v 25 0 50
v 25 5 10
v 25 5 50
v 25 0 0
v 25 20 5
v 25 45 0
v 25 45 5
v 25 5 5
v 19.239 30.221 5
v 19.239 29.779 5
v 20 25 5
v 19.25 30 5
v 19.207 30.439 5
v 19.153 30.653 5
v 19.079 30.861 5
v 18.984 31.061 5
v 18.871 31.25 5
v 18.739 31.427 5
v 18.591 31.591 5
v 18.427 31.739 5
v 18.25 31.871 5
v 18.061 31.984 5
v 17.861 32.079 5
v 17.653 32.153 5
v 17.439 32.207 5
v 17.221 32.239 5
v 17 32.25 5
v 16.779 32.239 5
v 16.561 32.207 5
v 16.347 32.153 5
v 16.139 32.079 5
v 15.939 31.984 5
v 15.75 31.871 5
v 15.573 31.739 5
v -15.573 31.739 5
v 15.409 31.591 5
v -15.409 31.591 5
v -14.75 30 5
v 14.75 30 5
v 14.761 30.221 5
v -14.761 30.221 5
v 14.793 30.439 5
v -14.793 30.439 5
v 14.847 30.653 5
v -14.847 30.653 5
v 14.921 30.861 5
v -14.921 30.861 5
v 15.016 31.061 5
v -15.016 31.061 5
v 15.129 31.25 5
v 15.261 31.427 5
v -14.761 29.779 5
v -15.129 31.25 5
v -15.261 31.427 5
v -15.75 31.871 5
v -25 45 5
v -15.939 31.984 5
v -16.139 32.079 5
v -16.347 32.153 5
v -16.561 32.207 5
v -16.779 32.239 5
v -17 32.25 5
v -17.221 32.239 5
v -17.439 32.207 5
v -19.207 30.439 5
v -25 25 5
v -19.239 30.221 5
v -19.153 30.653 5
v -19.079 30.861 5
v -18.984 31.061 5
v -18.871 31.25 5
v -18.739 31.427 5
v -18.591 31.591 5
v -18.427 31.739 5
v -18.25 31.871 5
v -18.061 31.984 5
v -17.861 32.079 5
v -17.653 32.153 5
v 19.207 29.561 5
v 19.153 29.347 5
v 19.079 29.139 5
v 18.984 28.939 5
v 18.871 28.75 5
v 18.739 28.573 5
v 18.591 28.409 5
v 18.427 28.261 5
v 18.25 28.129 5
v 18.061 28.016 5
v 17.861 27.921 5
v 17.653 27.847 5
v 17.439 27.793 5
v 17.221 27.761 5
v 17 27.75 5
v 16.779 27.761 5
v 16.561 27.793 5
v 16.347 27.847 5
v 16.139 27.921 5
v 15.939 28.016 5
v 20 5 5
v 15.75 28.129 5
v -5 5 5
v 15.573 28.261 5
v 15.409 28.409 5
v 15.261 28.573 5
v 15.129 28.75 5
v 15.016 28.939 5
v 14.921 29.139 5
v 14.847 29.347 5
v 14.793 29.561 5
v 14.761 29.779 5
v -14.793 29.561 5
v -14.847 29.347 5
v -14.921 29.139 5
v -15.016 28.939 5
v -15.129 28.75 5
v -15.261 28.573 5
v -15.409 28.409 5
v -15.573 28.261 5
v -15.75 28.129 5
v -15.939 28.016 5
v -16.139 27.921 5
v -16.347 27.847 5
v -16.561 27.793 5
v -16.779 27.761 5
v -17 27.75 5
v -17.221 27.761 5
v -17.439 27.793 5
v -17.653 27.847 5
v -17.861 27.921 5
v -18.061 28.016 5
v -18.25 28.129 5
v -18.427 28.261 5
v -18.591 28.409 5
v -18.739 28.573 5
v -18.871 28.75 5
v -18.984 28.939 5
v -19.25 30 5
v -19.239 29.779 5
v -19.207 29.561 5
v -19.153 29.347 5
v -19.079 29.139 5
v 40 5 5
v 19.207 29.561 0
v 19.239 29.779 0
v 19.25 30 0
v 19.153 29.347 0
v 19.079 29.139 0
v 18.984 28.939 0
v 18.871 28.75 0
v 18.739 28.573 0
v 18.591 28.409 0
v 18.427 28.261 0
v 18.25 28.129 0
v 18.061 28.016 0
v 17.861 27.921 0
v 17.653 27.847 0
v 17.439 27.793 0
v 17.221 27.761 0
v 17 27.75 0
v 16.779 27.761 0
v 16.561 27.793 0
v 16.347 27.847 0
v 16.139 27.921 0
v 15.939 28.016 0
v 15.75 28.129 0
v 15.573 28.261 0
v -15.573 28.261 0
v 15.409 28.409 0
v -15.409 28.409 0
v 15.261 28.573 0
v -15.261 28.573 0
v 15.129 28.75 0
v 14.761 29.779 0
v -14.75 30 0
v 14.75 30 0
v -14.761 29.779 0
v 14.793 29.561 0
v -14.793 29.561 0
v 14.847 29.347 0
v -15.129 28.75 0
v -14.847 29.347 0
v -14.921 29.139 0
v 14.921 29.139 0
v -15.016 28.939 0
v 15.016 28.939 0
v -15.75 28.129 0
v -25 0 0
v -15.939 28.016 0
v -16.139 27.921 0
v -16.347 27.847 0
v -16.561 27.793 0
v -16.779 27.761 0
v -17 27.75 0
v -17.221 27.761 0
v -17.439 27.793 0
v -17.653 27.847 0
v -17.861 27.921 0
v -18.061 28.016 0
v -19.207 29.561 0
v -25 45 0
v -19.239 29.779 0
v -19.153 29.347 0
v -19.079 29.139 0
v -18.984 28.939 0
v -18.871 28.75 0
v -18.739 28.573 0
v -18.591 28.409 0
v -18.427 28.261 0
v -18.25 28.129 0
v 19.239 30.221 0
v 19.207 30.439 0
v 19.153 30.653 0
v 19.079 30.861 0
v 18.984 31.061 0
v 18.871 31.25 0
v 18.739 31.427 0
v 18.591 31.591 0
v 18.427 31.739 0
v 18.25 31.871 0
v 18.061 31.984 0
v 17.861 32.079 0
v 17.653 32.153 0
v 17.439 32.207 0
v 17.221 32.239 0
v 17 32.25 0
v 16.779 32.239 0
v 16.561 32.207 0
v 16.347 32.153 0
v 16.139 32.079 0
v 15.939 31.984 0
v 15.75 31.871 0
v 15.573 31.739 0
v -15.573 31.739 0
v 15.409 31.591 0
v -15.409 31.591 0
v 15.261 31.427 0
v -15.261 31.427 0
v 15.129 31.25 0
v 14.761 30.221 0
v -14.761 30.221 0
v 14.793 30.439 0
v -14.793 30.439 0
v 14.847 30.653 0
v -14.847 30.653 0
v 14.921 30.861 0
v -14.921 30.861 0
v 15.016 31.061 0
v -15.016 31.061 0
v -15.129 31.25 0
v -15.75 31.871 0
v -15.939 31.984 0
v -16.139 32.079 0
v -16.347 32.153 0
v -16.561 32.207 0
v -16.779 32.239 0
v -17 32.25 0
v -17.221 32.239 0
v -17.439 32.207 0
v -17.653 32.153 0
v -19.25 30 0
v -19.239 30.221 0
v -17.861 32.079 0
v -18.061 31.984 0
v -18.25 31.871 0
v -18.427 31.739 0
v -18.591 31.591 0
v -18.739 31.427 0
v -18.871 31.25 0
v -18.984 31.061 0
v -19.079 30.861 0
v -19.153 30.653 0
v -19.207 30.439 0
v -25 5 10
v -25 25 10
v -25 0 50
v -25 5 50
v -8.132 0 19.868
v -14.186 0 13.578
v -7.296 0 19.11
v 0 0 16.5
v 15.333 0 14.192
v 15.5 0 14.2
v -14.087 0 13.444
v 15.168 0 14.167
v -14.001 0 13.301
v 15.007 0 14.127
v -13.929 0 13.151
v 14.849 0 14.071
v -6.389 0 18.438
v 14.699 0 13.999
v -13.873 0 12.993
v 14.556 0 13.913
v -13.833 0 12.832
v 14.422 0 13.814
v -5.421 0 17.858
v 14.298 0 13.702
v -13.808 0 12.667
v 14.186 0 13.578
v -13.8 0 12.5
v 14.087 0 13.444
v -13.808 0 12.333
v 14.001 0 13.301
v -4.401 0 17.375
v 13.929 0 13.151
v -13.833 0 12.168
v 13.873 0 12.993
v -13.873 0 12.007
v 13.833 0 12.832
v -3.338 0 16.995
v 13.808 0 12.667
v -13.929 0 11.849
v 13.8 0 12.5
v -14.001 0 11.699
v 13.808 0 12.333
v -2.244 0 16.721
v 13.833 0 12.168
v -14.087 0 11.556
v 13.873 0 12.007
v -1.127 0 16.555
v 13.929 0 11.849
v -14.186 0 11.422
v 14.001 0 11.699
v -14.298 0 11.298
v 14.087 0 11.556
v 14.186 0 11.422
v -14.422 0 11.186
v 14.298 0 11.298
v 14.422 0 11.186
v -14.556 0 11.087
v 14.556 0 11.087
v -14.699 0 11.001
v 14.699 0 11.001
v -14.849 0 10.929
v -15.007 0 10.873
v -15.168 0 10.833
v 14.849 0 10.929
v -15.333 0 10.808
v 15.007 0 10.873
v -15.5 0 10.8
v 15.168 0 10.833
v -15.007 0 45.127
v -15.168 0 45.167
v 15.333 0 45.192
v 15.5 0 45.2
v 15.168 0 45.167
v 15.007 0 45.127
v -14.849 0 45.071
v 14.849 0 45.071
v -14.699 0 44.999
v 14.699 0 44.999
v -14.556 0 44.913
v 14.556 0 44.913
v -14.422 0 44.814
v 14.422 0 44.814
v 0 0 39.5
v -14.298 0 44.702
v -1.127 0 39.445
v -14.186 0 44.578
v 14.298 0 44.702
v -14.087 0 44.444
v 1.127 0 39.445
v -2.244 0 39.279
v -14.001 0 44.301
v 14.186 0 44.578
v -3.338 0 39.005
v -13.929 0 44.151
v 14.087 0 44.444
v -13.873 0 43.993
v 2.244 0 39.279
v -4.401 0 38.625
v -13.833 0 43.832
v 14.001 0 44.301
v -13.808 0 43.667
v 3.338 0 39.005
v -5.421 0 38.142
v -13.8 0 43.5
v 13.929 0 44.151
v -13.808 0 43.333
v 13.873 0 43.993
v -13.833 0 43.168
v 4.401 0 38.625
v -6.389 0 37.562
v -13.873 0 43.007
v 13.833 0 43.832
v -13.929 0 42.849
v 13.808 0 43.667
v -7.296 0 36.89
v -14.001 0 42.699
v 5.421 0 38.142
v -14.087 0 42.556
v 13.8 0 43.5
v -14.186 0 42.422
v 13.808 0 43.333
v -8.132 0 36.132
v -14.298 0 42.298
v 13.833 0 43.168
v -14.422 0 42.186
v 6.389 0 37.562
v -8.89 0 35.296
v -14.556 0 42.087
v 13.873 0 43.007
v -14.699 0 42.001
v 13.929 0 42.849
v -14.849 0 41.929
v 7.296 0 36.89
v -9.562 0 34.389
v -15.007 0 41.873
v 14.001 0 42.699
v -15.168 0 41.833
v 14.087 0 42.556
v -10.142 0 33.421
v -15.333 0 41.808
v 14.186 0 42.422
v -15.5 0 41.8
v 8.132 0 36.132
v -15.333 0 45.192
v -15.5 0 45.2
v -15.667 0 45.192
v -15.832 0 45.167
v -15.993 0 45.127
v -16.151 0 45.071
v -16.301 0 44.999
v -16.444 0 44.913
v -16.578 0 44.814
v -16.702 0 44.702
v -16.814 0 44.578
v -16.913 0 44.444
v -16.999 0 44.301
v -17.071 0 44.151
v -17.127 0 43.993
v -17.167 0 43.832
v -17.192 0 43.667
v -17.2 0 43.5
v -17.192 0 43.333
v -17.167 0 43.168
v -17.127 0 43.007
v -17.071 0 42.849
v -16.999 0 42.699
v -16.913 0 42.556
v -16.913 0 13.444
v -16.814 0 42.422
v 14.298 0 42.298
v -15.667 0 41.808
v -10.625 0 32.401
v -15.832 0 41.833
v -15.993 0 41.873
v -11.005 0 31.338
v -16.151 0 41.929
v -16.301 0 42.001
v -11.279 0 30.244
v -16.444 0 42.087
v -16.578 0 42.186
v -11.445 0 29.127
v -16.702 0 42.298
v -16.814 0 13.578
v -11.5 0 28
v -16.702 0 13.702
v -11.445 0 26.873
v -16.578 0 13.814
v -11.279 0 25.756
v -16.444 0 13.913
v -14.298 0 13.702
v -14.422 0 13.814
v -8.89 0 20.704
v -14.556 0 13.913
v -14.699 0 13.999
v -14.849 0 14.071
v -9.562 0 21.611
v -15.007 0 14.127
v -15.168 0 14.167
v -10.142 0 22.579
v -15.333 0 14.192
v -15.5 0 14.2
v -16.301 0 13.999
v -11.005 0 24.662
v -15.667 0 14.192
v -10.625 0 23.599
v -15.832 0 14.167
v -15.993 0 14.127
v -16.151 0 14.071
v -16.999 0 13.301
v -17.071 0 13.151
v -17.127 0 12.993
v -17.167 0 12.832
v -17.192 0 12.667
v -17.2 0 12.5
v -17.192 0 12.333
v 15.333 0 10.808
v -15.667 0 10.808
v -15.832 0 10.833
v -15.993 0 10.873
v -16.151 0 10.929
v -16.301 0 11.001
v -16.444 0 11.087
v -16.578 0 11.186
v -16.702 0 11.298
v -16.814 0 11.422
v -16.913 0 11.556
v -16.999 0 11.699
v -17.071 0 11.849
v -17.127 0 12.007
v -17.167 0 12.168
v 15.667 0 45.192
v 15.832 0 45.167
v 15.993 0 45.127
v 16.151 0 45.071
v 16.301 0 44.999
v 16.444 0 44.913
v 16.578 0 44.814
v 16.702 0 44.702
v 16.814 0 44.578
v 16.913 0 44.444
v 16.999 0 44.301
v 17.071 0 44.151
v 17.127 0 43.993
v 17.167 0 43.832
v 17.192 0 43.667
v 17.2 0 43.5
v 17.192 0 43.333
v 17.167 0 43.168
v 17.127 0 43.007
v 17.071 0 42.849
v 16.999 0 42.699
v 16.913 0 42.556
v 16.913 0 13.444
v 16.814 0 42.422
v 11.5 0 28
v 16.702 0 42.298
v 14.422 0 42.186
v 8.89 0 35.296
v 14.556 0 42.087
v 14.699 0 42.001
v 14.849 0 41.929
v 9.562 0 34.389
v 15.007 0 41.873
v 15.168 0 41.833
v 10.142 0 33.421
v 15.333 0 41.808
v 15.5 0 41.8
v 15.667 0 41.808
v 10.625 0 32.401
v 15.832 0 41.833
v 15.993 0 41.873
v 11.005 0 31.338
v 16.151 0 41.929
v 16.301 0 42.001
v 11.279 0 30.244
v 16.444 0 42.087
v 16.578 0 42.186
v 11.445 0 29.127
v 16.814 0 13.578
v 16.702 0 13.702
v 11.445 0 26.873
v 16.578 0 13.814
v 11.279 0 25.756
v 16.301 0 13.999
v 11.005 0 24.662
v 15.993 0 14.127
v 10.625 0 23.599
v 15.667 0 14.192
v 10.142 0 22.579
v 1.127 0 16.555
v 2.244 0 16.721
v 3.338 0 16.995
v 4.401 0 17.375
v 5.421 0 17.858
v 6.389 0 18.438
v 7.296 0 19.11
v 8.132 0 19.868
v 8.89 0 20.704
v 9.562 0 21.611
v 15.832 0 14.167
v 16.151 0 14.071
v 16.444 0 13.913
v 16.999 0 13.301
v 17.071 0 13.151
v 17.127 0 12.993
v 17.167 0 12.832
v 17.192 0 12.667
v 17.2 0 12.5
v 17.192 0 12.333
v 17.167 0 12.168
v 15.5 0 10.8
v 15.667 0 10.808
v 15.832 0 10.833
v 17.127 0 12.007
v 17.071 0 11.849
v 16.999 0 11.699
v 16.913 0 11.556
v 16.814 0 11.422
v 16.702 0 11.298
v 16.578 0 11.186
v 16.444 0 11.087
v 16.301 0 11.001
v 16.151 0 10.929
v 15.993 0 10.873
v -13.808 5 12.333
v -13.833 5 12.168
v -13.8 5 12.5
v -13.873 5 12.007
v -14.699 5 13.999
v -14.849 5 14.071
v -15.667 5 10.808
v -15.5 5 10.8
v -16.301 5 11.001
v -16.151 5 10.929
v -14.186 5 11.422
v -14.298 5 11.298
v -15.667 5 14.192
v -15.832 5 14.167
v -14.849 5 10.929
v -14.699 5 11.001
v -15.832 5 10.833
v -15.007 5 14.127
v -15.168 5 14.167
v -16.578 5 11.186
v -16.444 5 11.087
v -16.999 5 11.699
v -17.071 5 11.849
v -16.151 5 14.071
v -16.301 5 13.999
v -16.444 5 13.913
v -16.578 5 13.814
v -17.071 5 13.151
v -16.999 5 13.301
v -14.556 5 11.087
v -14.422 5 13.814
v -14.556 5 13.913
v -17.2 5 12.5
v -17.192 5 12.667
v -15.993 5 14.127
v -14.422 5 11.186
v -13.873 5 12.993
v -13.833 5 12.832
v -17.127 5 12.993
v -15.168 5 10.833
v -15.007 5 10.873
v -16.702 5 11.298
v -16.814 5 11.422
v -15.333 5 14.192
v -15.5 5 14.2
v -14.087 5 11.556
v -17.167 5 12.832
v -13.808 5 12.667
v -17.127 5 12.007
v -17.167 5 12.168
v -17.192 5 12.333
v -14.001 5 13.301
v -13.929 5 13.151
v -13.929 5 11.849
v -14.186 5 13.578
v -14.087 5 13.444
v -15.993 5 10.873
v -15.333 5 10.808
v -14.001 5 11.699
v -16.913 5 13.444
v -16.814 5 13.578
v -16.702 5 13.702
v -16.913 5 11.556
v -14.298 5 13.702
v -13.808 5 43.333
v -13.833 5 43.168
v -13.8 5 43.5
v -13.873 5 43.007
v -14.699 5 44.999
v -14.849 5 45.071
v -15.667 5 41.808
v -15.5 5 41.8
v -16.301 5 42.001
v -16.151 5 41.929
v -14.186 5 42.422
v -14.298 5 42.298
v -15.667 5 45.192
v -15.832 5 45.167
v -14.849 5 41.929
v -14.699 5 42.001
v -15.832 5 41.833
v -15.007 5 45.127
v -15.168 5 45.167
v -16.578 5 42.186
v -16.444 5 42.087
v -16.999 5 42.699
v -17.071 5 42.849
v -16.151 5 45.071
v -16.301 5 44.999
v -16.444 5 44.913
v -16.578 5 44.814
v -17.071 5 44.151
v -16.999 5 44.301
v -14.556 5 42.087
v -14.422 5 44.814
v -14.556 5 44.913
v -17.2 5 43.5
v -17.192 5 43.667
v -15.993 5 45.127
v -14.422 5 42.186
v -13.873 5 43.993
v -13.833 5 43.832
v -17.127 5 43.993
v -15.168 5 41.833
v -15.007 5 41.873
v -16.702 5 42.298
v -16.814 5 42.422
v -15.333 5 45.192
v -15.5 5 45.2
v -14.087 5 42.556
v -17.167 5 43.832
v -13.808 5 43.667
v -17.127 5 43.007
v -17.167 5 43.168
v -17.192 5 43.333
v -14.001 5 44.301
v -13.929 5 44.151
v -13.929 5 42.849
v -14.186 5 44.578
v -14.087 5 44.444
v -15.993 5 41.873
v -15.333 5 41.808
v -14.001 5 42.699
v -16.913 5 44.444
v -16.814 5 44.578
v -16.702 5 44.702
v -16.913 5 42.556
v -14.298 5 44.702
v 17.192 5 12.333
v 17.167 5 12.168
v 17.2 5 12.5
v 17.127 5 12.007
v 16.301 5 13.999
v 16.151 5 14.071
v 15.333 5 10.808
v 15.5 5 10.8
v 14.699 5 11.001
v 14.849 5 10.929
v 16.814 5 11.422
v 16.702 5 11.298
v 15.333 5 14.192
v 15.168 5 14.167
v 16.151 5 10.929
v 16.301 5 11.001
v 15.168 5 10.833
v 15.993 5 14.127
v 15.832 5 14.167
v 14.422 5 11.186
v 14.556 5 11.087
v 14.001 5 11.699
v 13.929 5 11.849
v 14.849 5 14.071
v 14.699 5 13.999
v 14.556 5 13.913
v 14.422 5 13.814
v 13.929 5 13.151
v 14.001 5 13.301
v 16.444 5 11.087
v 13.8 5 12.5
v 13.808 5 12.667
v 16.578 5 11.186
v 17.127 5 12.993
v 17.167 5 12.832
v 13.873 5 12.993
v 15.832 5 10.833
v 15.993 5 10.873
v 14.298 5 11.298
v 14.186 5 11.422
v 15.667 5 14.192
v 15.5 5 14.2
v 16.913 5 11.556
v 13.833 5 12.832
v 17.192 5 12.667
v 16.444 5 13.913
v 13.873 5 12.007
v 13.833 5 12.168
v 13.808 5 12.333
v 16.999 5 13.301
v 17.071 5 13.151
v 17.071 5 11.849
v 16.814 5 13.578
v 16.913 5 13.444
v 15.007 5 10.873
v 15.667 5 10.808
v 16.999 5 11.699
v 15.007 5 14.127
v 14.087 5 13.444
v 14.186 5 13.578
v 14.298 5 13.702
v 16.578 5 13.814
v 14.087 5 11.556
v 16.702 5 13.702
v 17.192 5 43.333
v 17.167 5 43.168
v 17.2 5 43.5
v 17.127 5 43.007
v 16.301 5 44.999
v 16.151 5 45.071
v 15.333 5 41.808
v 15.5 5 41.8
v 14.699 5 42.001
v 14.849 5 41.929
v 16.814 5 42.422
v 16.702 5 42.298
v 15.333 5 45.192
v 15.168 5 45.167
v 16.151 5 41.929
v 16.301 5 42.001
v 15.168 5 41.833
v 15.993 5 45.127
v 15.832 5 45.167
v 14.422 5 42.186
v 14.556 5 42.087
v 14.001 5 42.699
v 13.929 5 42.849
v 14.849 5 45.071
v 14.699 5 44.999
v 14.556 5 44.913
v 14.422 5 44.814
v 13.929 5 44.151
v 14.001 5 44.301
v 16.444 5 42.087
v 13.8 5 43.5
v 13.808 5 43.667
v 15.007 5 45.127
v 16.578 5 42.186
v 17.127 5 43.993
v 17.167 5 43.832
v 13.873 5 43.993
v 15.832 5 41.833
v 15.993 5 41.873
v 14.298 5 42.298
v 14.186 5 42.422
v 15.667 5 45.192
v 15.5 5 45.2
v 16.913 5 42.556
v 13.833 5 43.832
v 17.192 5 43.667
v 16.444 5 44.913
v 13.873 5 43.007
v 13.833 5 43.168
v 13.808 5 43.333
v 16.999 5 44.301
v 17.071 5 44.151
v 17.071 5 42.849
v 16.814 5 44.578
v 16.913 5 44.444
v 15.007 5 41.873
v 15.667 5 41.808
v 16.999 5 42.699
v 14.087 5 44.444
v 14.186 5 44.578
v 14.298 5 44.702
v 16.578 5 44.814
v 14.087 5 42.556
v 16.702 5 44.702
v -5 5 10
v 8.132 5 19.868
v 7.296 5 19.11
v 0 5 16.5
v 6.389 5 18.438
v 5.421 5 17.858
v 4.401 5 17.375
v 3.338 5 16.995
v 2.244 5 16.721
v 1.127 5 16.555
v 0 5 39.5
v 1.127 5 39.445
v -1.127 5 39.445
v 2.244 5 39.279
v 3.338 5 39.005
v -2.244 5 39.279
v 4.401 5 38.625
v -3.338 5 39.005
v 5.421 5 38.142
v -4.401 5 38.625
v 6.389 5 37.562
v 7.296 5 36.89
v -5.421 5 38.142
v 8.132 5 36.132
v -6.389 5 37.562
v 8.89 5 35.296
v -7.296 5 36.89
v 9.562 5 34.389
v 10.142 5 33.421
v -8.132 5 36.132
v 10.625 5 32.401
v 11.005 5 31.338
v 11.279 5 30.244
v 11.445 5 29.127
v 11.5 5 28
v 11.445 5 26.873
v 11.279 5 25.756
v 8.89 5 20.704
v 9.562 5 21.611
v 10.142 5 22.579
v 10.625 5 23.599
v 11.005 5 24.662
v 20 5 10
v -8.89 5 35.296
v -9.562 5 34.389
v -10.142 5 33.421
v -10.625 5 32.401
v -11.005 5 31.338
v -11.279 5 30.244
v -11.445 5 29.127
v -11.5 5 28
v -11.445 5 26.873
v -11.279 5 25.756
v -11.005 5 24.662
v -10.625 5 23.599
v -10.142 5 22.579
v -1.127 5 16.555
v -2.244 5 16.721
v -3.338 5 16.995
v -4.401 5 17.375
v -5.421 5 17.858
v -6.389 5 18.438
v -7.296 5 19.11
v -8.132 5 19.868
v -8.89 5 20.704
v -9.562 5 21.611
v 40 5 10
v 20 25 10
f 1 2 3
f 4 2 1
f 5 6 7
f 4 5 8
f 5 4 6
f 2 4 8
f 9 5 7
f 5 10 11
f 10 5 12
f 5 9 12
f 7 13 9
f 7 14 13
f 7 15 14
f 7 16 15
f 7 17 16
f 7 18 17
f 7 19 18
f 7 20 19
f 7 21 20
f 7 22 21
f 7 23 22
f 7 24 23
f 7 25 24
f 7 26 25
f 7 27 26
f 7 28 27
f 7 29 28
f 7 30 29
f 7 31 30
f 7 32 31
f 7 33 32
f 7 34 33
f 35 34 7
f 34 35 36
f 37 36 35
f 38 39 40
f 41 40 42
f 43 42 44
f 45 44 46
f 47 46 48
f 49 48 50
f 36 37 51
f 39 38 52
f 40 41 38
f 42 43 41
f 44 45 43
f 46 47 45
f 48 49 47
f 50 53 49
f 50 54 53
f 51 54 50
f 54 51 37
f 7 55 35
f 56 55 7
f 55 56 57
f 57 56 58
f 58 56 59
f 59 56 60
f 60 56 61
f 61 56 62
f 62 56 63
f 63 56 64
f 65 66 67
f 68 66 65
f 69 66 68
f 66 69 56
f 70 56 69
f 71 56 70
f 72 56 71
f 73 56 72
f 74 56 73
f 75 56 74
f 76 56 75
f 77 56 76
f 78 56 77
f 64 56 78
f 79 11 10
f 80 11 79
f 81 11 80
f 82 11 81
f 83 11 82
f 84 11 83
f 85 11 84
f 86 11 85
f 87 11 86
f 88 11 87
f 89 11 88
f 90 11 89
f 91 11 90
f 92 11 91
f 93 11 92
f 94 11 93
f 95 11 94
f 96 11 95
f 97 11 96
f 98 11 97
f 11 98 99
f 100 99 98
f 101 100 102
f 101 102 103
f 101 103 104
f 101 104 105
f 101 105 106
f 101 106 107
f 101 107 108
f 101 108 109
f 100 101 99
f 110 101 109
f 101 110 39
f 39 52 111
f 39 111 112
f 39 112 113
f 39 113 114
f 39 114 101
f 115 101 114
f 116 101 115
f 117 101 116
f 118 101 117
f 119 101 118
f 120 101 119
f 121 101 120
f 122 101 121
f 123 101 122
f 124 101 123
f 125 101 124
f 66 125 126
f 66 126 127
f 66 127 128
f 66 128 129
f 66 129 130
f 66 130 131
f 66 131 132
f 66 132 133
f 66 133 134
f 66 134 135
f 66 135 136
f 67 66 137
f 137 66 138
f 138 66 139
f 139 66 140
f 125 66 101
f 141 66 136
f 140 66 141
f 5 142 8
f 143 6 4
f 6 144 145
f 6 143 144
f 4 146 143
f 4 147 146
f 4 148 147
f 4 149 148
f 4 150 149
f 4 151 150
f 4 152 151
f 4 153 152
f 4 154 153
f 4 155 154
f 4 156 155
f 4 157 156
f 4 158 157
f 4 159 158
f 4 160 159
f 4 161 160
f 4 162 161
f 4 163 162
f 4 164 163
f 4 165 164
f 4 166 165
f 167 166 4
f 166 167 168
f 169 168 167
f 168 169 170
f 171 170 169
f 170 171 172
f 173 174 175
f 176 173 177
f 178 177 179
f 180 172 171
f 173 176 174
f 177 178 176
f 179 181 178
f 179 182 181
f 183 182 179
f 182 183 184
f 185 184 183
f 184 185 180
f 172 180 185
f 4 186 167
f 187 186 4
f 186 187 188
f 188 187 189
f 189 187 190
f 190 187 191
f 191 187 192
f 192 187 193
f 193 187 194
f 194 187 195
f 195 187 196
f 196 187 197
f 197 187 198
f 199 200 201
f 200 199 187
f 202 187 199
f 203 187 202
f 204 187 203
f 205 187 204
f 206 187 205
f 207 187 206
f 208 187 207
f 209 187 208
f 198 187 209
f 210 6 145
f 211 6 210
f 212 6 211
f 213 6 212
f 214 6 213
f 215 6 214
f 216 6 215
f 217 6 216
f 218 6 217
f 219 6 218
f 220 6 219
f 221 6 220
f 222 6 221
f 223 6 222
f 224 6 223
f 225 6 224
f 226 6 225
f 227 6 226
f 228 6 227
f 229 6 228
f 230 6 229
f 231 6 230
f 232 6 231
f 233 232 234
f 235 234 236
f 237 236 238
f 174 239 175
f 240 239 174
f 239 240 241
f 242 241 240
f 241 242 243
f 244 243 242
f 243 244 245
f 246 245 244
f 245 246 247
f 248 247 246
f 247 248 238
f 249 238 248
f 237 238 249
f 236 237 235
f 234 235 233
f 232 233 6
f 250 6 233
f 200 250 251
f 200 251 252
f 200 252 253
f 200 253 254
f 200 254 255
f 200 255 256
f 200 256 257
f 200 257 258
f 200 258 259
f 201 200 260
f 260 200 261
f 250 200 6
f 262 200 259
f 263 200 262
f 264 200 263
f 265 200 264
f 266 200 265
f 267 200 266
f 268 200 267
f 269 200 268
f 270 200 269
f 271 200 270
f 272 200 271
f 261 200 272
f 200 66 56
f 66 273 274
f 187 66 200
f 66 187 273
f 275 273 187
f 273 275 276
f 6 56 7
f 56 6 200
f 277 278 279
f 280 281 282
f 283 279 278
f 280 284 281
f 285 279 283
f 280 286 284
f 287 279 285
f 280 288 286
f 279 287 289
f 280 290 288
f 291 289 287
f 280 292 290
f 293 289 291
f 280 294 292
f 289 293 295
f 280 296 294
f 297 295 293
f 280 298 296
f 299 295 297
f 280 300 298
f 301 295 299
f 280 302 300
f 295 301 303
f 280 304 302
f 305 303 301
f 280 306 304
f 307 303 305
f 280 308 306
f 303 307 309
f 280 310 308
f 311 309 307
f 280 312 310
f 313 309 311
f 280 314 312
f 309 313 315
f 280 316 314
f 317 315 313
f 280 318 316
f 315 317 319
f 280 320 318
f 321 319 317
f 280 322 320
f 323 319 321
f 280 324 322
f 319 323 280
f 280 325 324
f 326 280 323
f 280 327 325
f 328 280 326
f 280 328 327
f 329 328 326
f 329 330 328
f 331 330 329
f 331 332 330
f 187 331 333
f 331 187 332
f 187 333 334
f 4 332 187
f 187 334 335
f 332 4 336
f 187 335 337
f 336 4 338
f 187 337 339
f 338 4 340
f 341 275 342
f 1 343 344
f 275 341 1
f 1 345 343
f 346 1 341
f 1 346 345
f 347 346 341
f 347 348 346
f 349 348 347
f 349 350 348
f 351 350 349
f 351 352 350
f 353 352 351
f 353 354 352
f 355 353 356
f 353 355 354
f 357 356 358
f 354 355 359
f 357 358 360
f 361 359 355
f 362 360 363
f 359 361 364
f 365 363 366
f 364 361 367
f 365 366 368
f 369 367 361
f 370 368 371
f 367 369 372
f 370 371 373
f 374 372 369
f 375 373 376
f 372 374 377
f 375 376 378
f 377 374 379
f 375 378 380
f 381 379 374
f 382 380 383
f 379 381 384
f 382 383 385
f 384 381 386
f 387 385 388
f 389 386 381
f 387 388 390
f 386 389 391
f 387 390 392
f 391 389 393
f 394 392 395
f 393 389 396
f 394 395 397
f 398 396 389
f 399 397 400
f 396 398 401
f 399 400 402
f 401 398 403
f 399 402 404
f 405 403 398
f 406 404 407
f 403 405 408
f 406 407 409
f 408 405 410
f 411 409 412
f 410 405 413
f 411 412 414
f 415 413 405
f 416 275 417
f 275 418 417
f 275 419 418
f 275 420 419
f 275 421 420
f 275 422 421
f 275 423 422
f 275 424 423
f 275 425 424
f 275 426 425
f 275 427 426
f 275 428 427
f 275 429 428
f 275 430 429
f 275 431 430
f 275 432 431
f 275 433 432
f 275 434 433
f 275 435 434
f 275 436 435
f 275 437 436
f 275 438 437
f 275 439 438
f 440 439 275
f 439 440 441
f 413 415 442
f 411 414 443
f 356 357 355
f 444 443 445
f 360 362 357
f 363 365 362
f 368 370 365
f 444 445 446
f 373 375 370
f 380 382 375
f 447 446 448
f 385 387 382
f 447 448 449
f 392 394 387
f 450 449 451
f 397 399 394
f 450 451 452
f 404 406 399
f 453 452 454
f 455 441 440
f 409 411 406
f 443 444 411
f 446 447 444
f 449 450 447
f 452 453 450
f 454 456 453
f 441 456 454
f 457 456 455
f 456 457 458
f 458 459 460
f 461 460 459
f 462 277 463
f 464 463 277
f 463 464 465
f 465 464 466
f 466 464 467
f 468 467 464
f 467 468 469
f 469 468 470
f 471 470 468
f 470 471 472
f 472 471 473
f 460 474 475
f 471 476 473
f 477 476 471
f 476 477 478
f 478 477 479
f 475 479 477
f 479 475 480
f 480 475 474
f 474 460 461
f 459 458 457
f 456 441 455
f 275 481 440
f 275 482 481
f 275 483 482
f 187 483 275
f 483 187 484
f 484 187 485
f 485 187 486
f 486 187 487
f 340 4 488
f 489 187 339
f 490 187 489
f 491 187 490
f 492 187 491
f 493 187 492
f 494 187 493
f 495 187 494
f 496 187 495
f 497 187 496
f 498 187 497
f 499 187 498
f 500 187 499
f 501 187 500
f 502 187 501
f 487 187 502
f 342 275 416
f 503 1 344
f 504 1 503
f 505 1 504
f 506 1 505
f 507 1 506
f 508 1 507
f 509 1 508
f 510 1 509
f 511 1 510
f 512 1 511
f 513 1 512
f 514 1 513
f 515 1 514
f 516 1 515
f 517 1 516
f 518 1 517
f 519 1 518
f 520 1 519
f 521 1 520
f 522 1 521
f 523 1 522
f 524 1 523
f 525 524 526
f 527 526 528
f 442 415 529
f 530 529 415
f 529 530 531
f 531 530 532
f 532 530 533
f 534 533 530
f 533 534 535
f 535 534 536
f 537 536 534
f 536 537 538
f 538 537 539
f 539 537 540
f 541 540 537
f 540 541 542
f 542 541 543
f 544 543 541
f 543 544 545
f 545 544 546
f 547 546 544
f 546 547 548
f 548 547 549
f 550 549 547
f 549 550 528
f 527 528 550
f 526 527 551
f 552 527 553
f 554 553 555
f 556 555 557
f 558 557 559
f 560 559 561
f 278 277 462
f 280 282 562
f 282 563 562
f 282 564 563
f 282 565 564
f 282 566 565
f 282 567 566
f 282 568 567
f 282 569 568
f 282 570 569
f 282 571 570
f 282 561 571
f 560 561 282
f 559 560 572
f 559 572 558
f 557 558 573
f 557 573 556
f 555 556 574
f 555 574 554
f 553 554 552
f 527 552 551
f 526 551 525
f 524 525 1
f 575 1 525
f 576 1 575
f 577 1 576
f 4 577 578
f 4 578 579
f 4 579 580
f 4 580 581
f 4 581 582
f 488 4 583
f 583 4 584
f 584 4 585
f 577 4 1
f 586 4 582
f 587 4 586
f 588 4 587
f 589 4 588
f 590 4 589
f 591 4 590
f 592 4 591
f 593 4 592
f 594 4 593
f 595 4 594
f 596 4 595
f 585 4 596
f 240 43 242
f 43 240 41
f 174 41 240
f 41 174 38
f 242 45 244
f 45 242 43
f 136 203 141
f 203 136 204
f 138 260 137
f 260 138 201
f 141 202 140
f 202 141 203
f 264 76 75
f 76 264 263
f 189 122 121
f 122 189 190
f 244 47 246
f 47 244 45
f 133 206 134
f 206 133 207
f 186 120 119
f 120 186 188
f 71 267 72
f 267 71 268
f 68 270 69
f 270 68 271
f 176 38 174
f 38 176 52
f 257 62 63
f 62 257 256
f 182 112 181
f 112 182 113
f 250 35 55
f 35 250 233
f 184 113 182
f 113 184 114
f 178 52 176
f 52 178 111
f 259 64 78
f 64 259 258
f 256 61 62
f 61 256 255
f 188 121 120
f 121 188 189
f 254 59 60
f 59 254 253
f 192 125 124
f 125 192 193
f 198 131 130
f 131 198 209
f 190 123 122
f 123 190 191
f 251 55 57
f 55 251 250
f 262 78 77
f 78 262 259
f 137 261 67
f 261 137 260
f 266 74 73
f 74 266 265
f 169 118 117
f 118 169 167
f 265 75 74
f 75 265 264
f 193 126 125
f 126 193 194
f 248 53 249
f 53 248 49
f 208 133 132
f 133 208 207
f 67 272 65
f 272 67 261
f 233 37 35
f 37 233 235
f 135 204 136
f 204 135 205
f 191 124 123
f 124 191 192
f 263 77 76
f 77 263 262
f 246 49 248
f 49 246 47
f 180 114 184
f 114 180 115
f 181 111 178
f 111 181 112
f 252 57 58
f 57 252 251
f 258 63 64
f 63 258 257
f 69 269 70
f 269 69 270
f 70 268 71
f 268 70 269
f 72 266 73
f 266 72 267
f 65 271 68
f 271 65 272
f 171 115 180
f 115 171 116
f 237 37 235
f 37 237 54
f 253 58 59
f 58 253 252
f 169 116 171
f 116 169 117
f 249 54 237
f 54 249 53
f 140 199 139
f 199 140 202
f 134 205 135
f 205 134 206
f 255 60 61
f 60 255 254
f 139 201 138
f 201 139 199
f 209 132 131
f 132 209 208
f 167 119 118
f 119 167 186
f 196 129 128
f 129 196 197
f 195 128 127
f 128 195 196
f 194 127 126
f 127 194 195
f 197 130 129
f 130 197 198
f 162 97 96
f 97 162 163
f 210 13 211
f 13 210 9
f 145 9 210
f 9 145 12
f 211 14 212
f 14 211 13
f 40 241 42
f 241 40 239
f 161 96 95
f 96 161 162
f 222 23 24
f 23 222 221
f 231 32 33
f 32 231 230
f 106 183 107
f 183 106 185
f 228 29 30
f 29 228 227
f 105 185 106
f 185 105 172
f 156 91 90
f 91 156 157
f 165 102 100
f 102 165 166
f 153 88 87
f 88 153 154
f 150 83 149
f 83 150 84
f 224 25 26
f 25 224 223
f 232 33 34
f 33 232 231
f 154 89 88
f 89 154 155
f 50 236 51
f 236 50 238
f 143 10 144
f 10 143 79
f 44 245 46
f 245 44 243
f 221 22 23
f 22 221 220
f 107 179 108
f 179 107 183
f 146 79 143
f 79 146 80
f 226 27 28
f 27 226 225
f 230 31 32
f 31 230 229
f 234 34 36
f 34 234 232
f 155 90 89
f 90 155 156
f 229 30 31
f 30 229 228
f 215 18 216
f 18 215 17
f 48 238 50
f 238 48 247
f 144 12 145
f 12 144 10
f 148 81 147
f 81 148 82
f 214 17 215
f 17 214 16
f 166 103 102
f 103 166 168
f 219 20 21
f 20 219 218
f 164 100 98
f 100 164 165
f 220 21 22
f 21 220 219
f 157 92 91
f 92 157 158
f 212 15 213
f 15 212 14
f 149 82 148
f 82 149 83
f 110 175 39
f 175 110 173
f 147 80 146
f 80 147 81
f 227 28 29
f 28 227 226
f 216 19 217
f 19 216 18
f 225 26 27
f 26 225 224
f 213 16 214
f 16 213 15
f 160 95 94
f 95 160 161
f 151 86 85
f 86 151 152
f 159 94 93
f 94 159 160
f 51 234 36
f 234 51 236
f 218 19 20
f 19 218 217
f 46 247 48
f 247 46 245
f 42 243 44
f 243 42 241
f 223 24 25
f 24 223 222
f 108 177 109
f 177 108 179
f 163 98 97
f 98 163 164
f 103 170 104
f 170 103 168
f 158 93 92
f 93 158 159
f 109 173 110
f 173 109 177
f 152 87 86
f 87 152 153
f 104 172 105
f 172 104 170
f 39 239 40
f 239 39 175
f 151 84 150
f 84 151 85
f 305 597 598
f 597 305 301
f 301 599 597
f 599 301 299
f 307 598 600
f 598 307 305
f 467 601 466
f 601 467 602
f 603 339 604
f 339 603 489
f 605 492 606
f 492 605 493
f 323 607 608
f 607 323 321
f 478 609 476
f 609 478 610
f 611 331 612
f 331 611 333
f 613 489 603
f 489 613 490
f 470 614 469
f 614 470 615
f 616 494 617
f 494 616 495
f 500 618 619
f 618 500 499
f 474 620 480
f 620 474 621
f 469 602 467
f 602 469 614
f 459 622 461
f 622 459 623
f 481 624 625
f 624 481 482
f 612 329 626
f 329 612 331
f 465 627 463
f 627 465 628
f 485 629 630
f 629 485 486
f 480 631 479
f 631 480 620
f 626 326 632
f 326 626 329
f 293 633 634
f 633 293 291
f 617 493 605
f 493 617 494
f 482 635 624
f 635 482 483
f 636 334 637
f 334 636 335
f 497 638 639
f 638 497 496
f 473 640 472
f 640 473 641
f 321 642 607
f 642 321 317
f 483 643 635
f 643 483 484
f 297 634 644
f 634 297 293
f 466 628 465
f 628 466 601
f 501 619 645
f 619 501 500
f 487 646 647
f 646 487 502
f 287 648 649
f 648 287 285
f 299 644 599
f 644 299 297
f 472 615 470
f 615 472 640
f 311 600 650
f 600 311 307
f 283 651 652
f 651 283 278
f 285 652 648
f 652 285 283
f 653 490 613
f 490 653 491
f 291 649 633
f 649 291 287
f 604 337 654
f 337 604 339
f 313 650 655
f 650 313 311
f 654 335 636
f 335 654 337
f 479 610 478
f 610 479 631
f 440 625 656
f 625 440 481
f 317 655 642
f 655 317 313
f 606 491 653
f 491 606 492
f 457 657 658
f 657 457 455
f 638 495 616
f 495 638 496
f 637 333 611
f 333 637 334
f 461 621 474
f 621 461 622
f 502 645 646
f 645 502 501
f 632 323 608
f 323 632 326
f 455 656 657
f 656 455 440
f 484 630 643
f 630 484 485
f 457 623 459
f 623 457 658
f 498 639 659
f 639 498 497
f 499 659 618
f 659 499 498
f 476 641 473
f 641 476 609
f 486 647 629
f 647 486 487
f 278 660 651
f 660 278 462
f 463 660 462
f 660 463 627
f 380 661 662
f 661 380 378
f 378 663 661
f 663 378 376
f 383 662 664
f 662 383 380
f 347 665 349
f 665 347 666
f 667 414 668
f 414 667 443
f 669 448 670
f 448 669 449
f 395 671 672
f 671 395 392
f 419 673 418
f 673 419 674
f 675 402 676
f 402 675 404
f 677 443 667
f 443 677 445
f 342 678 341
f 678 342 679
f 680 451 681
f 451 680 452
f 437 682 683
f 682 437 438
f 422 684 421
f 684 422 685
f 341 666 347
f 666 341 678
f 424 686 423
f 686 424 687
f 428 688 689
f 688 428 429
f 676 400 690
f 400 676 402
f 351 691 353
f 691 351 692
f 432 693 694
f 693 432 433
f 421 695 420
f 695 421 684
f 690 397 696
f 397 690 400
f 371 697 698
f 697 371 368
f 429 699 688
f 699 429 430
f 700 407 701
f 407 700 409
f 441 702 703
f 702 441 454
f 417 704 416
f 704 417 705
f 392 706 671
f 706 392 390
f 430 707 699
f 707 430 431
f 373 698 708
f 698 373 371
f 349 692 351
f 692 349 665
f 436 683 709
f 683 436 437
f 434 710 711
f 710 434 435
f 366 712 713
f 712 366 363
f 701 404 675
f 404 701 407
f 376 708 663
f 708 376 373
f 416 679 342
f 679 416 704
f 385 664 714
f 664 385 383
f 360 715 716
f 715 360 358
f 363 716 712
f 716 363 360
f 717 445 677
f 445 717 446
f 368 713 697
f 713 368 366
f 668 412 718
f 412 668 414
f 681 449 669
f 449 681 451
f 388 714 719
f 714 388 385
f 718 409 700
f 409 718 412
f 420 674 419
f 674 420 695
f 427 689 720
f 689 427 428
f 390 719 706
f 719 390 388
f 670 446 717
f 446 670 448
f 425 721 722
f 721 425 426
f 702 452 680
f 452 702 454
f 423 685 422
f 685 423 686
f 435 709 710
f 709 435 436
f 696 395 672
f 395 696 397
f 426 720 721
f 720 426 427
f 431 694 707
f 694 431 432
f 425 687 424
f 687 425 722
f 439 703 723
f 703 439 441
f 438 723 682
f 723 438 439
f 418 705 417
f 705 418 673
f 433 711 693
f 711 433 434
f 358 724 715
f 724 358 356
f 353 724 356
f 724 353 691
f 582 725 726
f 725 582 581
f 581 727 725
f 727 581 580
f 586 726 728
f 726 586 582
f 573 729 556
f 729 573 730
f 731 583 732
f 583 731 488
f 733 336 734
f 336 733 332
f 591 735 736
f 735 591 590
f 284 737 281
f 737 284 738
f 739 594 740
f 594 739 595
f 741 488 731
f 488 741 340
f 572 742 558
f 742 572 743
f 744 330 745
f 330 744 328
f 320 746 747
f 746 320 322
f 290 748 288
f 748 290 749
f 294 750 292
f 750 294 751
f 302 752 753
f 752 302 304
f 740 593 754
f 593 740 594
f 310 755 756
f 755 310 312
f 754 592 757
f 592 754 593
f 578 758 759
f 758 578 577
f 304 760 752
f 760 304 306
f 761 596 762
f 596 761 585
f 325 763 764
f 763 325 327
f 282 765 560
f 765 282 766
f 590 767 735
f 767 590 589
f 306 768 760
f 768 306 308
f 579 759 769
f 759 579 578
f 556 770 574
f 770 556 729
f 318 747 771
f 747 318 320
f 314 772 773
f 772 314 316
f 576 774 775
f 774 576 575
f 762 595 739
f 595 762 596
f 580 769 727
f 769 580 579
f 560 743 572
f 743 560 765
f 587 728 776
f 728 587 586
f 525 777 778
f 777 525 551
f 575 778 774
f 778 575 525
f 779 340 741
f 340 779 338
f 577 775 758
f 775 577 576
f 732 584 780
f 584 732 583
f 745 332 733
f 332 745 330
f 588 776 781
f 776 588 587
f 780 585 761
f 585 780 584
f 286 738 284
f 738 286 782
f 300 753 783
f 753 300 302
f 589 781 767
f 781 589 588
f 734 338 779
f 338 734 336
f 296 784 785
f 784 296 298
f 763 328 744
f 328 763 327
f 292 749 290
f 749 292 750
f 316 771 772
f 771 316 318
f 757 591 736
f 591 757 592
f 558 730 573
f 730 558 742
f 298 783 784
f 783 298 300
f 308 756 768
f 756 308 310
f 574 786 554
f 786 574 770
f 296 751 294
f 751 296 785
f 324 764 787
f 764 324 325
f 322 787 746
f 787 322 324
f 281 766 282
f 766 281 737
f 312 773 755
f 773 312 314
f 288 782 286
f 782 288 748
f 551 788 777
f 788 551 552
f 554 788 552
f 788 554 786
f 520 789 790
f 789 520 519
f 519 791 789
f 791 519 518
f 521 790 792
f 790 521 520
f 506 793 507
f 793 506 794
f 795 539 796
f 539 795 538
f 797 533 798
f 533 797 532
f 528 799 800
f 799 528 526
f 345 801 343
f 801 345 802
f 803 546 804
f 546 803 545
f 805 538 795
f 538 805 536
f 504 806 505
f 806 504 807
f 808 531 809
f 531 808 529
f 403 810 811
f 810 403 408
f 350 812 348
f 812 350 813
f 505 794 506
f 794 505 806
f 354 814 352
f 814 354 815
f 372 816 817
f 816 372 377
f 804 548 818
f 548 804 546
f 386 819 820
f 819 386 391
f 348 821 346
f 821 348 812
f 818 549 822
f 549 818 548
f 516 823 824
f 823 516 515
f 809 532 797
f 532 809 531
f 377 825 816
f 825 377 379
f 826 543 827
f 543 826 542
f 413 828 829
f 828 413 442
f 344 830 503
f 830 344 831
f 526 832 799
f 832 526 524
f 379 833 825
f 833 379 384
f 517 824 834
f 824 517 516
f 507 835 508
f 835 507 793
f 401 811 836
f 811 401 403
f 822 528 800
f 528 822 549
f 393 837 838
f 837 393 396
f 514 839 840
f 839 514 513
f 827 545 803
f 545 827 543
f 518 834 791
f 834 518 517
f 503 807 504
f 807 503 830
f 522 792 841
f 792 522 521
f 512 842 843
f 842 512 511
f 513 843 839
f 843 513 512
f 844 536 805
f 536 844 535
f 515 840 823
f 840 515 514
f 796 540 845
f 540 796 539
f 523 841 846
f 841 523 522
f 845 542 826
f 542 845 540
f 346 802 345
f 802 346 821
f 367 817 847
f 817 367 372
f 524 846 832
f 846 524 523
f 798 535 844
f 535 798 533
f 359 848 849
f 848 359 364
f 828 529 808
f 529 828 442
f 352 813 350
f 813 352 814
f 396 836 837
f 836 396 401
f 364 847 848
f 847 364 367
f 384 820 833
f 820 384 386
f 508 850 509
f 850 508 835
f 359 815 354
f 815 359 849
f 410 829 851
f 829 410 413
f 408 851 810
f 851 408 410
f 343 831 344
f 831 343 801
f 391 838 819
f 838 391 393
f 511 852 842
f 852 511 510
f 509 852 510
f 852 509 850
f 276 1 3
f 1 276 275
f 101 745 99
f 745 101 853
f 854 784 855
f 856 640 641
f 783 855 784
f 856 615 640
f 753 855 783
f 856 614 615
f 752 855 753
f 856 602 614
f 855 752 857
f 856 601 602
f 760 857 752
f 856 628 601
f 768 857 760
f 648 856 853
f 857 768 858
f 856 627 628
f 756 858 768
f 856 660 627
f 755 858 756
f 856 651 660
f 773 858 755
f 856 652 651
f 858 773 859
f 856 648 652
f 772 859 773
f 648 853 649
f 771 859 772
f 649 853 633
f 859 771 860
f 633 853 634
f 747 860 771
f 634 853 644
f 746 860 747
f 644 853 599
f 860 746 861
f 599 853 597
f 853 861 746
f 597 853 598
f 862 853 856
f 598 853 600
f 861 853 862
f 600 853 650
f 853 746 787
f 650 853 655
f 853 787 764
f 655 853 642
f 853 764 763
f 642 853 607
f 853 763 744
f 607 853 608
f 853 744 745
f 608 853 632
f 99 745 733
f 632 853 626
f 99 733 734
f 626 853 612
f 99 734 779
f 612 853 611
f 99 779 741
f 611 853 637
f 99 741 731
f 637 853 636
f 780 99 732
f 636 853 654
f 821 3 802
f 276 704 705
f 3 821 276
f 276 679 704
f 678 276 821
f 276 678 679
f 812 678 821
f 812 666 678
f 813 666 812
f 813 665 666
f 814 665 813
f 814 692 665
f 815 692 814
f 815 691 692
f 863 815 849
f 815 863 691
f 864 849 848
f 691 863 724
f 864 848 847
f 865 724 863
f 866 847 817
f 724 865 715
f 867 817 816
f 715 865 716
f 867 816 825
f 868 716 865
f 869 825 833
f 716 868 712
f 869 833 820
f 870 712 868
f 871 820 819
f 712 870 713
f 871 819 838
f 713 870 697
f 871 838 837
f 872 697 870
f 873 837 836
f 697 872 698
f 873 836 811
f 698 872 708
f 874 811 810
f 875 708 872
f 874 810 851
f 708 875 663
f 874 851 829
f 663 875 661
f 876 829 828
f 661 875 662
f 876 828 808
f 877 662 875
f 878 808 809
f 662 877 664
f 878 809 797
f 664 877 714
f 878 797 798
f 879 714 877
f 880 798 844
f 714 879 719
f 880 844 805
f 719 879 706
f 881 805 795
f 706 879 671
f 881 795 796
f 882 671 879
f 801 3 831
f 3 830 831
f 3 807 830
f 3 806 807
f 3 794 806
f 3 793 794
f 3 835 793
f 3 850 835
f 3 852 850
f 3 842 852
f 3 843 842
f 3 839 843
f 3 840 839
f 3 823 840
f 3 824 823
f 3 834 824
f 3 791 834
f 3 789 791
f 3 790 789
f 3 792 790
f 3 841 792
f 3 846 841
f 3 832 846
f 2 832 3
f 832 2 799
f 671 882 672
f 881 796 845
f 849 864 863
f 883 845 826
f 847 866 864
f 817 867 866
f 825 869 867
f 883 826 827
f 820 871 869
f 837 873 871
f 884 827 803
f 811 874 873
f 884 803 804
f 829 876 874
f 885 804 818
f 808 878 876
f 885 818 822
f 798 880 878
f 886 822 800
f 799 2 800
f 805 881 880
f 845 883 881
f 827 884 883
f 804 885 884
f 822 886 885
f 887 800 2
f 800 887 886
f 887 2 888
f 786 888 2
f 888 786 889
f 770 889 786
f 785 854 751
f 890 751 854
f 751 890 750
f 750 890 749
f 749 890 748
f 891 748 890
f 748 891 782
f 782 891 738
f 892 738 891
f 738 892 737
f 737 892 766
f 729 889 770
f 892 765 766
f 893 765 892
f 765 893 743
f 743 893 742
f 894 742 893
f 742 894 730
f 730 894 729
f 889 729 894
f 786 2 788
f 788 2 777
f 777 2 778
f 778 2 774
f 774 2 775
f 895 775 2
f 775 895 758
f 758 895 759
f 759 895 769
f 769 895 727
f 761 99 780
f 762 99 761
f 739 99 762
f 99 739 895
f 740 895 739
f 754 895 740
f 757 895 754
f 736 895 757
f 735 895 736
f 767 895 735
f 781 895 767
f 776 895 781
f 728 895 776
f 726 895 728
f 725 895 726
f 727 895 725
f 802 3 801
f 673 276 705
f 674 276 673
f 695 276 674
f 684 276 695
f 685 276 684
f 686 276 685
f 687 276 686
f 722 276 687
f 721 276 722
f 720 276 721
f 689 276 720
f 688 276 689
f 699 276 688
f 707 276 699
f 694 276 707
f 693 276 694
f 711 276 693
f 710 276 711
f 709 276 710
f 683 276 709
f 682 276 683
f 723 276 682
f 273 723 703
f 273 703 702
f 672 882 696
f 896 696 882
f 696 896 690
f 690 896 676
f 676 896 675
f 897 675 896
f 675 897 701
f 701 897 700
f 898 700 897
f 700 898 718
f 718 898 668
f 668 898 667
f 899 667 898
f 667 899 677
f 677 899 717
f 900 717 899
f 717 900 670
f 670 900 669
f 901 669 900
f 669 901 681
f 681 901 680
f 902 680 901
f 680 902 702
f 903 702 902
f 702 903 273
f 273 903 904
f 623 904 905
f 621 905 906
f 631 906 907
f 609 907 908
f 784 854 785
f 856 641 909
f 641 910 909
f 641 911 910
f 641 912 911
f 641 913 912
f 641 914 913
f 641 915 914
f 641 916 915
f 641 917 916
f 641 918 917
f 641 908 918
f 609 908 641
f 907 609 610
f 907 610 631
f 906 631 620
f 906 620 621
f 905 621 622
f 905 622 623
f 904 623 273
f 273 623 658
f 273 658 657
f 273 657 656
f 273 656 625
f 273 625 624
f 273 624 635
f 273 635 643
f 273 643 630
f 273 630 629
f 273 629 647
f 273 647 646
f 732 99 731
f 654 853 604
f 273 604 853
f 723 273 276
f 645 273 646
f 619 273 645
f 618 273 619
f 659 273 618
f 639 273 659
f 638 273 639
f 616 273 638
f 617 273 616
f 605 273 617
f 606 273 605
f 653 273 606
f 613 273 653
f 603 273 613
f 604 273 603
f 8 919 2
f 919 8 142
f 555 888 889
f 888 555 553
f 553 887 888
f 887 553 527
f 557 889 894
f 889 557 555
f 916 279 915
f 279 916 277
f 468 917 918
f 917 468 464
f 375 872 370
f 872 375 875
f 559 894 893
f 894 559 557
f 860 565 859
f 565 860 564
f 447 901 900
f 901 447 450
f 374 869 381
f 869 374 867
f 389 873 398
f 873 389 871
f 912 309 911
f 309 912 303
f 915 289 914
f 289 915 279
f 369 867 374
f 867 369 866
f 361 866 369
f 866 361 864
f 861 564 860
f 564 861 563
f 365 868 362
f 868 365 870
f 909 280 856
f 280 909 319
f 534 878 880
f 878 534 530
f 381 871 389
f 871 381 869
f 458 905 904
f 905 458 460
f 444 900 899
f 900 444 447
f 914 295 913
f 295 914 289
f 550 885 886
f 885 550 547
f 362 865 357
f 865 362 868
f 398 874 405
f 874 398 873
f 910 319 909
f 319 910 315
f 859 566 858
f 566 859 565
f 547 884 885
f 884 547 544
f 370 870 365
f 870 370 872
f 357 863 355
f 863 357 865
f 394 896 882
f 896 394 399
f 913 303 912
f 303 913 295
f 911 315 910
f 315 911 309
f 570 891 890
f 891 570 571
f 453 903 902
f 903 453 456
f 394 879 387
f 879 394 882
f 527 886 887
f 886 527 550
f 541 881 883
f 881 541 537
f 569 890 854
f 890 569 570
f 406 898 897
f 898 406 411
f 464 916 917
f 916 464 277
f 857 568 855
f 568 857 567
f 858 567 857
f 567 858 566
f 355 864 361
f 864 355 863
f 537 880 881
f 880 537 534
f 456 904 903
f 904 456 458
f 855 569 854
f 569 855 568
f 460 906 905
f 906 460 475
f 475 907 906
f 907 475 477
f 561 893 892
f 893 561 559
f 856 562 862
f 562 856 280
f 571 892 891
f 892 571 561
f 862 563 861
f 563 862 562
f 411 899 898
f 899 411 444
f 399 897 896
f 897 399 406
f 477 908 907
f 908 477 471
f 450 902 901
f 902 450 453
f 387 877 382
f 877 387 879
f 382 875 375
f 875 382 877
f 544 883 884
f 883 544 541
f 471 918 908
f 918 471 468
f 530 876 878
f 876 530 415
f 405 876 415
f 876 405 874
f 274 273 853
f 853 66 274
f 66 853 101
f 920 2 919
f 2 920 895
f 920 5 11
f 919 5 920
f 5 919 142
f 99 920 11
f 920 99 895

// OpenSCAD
// L-Shaped NEMA 17 Motor Bracket for Syringe Pump
// Print Orientation: Base plate on XY plane (Z=0)

// --- Dimensions ---
// Base Plate
base_width_x = 50;           // From -25 to 25
base_depth_y = 45;           // From 0 to 45
base_height_z = 5;           // Thickness of base
base_hole_dia = 4.5;         // M4 through-holes
base_hole_x1 = -17;          // X position of hole 1
base_hole_x2 = 17;           // X position of hole 2
base_hole_y = 30;            // Y position of holes

// Vertical Motor Plate
motor_plate_width_x = 50;    // From -25 to 25
motor_plate_depth_y = 5;     // Thickness of vertical plate
motor_plate_height_z = 50;   // Total height from Z=0
motor_boss_dia = 23;         // Centering boss hole diameter
motor_boss_x = 0;            // Center X
motor_boss_z = 28;           // Center Z
motor_screw_dia = 3.4;       // M3 screw holes
motor_screw_pattern = 31;    // Square pattern for M3 screws

// Gussets
gusset_thickness = 5;        // Thickness of gussets
gusset_leg_y = 20;           // Leg length along Y
gusset_leg_z = 20;           // Leg length along Z
gusset_x_outer = 25;         // Outer edge X
gusset_x_inner = 20;         // Inner edge X

// --- Constants ---
$fn = 64;
eps = 0.1; // Overlap for clean boolean operations

// --- Main Assembly ---

union() {
    // 1. Base Plate
    difference() {
        // Main body: x from -25 to 25, y from 0 to 45, z from 0 to 5
        translate([-base_width_x/2, 0, 0])
            cube([base_width_x, base_depth_y, base_height_z]);
        
        // M4 Through-holes: 4.5 mm vertical through-holes at (x = -17, y = 30) and (x = 17, y = 30)
        translate([base_hole_x1, base_hole_y, -eps])
            cylinder(h = base_height_z + 2*eps, d = base_hole_dia);
        translate([base_hole_x2, base_hole_y, -eps])
            cylinder(h = base_height_z + 2*eps, d = base_hole_dia);
    }

    // 2. Vertical Motor Plate
    difference() {
        // Main body: x from -25 to 25, y from 0 to 5, z from 0 to 50
        translate([-motor_plate_width_x/2, 0, 0])
            cube([motor_plate_width_x, motor_plate_depth_y, motor_plate_height_z]);
        
        // Motor Centering Boss Hole: 23 mm hole, center x=0, z=28, along Y
        translate([motor_boss_x, -eps, motor_boss_z])
            rotate([-90, 0, 0])
            cylinder(h = motor_plate_depth_y + 2*eps, d = motor_boss_dia);
        
        // M3 Screw Holes: 3.4 mm holes on a 31 mm square pattern centered on boss
        for (sx = [-1, 1], sz = [-1, 1]) {
            translate([motor_boss_x + sx * (motor_screw_pattern/2), -eps, motor_boss_z + sz * (motor_screw_pattern/2)])
                rotate([-90, 0, 0])
                cylinder(h = motor_plate_depth_y + 2*eps, d = motor_screw_dia);
        }
    }

    // 3. Gussets
    // Right triangle in YZ plane, legs 20mm (Y and Z), right-angle corner at y=5, z=5.
    // Flush with edges x = -25 to -20 and x = 20 to 25.
    
    // Left Gusset (X: -25 to -20)
    translate([-25, 5, 5])
    rotate([0, 0, 0])
    linear_extrude(height = gusset_thickness)
    polygon(points = [
        [0, 0],               // Corner (Y=5, Z=5)
        [gusset_leg_y, 0],    // End of Y leg (Y=5+20=25)
        [0, gusset_leg_z]     // End of Z leg (Z=5+20=25)
    ]);

    // Right Gusset (X: 20 to 25)
    // To be flush with X=20 to 25, we translate to X=20 and extrude 5mm along X
    translate([20, 5, 5])
    rotate([0, 0, 0])
    linear_extrude(height = gusset_thickness)
    polygon(points = [
        [0, 0],               // Corner (Y=5, Z=5)
        [gusset_leg_y, 0],    // End of Y leg
        [0, gusset_leg_z]     // End of Z leg
    ]);
}
